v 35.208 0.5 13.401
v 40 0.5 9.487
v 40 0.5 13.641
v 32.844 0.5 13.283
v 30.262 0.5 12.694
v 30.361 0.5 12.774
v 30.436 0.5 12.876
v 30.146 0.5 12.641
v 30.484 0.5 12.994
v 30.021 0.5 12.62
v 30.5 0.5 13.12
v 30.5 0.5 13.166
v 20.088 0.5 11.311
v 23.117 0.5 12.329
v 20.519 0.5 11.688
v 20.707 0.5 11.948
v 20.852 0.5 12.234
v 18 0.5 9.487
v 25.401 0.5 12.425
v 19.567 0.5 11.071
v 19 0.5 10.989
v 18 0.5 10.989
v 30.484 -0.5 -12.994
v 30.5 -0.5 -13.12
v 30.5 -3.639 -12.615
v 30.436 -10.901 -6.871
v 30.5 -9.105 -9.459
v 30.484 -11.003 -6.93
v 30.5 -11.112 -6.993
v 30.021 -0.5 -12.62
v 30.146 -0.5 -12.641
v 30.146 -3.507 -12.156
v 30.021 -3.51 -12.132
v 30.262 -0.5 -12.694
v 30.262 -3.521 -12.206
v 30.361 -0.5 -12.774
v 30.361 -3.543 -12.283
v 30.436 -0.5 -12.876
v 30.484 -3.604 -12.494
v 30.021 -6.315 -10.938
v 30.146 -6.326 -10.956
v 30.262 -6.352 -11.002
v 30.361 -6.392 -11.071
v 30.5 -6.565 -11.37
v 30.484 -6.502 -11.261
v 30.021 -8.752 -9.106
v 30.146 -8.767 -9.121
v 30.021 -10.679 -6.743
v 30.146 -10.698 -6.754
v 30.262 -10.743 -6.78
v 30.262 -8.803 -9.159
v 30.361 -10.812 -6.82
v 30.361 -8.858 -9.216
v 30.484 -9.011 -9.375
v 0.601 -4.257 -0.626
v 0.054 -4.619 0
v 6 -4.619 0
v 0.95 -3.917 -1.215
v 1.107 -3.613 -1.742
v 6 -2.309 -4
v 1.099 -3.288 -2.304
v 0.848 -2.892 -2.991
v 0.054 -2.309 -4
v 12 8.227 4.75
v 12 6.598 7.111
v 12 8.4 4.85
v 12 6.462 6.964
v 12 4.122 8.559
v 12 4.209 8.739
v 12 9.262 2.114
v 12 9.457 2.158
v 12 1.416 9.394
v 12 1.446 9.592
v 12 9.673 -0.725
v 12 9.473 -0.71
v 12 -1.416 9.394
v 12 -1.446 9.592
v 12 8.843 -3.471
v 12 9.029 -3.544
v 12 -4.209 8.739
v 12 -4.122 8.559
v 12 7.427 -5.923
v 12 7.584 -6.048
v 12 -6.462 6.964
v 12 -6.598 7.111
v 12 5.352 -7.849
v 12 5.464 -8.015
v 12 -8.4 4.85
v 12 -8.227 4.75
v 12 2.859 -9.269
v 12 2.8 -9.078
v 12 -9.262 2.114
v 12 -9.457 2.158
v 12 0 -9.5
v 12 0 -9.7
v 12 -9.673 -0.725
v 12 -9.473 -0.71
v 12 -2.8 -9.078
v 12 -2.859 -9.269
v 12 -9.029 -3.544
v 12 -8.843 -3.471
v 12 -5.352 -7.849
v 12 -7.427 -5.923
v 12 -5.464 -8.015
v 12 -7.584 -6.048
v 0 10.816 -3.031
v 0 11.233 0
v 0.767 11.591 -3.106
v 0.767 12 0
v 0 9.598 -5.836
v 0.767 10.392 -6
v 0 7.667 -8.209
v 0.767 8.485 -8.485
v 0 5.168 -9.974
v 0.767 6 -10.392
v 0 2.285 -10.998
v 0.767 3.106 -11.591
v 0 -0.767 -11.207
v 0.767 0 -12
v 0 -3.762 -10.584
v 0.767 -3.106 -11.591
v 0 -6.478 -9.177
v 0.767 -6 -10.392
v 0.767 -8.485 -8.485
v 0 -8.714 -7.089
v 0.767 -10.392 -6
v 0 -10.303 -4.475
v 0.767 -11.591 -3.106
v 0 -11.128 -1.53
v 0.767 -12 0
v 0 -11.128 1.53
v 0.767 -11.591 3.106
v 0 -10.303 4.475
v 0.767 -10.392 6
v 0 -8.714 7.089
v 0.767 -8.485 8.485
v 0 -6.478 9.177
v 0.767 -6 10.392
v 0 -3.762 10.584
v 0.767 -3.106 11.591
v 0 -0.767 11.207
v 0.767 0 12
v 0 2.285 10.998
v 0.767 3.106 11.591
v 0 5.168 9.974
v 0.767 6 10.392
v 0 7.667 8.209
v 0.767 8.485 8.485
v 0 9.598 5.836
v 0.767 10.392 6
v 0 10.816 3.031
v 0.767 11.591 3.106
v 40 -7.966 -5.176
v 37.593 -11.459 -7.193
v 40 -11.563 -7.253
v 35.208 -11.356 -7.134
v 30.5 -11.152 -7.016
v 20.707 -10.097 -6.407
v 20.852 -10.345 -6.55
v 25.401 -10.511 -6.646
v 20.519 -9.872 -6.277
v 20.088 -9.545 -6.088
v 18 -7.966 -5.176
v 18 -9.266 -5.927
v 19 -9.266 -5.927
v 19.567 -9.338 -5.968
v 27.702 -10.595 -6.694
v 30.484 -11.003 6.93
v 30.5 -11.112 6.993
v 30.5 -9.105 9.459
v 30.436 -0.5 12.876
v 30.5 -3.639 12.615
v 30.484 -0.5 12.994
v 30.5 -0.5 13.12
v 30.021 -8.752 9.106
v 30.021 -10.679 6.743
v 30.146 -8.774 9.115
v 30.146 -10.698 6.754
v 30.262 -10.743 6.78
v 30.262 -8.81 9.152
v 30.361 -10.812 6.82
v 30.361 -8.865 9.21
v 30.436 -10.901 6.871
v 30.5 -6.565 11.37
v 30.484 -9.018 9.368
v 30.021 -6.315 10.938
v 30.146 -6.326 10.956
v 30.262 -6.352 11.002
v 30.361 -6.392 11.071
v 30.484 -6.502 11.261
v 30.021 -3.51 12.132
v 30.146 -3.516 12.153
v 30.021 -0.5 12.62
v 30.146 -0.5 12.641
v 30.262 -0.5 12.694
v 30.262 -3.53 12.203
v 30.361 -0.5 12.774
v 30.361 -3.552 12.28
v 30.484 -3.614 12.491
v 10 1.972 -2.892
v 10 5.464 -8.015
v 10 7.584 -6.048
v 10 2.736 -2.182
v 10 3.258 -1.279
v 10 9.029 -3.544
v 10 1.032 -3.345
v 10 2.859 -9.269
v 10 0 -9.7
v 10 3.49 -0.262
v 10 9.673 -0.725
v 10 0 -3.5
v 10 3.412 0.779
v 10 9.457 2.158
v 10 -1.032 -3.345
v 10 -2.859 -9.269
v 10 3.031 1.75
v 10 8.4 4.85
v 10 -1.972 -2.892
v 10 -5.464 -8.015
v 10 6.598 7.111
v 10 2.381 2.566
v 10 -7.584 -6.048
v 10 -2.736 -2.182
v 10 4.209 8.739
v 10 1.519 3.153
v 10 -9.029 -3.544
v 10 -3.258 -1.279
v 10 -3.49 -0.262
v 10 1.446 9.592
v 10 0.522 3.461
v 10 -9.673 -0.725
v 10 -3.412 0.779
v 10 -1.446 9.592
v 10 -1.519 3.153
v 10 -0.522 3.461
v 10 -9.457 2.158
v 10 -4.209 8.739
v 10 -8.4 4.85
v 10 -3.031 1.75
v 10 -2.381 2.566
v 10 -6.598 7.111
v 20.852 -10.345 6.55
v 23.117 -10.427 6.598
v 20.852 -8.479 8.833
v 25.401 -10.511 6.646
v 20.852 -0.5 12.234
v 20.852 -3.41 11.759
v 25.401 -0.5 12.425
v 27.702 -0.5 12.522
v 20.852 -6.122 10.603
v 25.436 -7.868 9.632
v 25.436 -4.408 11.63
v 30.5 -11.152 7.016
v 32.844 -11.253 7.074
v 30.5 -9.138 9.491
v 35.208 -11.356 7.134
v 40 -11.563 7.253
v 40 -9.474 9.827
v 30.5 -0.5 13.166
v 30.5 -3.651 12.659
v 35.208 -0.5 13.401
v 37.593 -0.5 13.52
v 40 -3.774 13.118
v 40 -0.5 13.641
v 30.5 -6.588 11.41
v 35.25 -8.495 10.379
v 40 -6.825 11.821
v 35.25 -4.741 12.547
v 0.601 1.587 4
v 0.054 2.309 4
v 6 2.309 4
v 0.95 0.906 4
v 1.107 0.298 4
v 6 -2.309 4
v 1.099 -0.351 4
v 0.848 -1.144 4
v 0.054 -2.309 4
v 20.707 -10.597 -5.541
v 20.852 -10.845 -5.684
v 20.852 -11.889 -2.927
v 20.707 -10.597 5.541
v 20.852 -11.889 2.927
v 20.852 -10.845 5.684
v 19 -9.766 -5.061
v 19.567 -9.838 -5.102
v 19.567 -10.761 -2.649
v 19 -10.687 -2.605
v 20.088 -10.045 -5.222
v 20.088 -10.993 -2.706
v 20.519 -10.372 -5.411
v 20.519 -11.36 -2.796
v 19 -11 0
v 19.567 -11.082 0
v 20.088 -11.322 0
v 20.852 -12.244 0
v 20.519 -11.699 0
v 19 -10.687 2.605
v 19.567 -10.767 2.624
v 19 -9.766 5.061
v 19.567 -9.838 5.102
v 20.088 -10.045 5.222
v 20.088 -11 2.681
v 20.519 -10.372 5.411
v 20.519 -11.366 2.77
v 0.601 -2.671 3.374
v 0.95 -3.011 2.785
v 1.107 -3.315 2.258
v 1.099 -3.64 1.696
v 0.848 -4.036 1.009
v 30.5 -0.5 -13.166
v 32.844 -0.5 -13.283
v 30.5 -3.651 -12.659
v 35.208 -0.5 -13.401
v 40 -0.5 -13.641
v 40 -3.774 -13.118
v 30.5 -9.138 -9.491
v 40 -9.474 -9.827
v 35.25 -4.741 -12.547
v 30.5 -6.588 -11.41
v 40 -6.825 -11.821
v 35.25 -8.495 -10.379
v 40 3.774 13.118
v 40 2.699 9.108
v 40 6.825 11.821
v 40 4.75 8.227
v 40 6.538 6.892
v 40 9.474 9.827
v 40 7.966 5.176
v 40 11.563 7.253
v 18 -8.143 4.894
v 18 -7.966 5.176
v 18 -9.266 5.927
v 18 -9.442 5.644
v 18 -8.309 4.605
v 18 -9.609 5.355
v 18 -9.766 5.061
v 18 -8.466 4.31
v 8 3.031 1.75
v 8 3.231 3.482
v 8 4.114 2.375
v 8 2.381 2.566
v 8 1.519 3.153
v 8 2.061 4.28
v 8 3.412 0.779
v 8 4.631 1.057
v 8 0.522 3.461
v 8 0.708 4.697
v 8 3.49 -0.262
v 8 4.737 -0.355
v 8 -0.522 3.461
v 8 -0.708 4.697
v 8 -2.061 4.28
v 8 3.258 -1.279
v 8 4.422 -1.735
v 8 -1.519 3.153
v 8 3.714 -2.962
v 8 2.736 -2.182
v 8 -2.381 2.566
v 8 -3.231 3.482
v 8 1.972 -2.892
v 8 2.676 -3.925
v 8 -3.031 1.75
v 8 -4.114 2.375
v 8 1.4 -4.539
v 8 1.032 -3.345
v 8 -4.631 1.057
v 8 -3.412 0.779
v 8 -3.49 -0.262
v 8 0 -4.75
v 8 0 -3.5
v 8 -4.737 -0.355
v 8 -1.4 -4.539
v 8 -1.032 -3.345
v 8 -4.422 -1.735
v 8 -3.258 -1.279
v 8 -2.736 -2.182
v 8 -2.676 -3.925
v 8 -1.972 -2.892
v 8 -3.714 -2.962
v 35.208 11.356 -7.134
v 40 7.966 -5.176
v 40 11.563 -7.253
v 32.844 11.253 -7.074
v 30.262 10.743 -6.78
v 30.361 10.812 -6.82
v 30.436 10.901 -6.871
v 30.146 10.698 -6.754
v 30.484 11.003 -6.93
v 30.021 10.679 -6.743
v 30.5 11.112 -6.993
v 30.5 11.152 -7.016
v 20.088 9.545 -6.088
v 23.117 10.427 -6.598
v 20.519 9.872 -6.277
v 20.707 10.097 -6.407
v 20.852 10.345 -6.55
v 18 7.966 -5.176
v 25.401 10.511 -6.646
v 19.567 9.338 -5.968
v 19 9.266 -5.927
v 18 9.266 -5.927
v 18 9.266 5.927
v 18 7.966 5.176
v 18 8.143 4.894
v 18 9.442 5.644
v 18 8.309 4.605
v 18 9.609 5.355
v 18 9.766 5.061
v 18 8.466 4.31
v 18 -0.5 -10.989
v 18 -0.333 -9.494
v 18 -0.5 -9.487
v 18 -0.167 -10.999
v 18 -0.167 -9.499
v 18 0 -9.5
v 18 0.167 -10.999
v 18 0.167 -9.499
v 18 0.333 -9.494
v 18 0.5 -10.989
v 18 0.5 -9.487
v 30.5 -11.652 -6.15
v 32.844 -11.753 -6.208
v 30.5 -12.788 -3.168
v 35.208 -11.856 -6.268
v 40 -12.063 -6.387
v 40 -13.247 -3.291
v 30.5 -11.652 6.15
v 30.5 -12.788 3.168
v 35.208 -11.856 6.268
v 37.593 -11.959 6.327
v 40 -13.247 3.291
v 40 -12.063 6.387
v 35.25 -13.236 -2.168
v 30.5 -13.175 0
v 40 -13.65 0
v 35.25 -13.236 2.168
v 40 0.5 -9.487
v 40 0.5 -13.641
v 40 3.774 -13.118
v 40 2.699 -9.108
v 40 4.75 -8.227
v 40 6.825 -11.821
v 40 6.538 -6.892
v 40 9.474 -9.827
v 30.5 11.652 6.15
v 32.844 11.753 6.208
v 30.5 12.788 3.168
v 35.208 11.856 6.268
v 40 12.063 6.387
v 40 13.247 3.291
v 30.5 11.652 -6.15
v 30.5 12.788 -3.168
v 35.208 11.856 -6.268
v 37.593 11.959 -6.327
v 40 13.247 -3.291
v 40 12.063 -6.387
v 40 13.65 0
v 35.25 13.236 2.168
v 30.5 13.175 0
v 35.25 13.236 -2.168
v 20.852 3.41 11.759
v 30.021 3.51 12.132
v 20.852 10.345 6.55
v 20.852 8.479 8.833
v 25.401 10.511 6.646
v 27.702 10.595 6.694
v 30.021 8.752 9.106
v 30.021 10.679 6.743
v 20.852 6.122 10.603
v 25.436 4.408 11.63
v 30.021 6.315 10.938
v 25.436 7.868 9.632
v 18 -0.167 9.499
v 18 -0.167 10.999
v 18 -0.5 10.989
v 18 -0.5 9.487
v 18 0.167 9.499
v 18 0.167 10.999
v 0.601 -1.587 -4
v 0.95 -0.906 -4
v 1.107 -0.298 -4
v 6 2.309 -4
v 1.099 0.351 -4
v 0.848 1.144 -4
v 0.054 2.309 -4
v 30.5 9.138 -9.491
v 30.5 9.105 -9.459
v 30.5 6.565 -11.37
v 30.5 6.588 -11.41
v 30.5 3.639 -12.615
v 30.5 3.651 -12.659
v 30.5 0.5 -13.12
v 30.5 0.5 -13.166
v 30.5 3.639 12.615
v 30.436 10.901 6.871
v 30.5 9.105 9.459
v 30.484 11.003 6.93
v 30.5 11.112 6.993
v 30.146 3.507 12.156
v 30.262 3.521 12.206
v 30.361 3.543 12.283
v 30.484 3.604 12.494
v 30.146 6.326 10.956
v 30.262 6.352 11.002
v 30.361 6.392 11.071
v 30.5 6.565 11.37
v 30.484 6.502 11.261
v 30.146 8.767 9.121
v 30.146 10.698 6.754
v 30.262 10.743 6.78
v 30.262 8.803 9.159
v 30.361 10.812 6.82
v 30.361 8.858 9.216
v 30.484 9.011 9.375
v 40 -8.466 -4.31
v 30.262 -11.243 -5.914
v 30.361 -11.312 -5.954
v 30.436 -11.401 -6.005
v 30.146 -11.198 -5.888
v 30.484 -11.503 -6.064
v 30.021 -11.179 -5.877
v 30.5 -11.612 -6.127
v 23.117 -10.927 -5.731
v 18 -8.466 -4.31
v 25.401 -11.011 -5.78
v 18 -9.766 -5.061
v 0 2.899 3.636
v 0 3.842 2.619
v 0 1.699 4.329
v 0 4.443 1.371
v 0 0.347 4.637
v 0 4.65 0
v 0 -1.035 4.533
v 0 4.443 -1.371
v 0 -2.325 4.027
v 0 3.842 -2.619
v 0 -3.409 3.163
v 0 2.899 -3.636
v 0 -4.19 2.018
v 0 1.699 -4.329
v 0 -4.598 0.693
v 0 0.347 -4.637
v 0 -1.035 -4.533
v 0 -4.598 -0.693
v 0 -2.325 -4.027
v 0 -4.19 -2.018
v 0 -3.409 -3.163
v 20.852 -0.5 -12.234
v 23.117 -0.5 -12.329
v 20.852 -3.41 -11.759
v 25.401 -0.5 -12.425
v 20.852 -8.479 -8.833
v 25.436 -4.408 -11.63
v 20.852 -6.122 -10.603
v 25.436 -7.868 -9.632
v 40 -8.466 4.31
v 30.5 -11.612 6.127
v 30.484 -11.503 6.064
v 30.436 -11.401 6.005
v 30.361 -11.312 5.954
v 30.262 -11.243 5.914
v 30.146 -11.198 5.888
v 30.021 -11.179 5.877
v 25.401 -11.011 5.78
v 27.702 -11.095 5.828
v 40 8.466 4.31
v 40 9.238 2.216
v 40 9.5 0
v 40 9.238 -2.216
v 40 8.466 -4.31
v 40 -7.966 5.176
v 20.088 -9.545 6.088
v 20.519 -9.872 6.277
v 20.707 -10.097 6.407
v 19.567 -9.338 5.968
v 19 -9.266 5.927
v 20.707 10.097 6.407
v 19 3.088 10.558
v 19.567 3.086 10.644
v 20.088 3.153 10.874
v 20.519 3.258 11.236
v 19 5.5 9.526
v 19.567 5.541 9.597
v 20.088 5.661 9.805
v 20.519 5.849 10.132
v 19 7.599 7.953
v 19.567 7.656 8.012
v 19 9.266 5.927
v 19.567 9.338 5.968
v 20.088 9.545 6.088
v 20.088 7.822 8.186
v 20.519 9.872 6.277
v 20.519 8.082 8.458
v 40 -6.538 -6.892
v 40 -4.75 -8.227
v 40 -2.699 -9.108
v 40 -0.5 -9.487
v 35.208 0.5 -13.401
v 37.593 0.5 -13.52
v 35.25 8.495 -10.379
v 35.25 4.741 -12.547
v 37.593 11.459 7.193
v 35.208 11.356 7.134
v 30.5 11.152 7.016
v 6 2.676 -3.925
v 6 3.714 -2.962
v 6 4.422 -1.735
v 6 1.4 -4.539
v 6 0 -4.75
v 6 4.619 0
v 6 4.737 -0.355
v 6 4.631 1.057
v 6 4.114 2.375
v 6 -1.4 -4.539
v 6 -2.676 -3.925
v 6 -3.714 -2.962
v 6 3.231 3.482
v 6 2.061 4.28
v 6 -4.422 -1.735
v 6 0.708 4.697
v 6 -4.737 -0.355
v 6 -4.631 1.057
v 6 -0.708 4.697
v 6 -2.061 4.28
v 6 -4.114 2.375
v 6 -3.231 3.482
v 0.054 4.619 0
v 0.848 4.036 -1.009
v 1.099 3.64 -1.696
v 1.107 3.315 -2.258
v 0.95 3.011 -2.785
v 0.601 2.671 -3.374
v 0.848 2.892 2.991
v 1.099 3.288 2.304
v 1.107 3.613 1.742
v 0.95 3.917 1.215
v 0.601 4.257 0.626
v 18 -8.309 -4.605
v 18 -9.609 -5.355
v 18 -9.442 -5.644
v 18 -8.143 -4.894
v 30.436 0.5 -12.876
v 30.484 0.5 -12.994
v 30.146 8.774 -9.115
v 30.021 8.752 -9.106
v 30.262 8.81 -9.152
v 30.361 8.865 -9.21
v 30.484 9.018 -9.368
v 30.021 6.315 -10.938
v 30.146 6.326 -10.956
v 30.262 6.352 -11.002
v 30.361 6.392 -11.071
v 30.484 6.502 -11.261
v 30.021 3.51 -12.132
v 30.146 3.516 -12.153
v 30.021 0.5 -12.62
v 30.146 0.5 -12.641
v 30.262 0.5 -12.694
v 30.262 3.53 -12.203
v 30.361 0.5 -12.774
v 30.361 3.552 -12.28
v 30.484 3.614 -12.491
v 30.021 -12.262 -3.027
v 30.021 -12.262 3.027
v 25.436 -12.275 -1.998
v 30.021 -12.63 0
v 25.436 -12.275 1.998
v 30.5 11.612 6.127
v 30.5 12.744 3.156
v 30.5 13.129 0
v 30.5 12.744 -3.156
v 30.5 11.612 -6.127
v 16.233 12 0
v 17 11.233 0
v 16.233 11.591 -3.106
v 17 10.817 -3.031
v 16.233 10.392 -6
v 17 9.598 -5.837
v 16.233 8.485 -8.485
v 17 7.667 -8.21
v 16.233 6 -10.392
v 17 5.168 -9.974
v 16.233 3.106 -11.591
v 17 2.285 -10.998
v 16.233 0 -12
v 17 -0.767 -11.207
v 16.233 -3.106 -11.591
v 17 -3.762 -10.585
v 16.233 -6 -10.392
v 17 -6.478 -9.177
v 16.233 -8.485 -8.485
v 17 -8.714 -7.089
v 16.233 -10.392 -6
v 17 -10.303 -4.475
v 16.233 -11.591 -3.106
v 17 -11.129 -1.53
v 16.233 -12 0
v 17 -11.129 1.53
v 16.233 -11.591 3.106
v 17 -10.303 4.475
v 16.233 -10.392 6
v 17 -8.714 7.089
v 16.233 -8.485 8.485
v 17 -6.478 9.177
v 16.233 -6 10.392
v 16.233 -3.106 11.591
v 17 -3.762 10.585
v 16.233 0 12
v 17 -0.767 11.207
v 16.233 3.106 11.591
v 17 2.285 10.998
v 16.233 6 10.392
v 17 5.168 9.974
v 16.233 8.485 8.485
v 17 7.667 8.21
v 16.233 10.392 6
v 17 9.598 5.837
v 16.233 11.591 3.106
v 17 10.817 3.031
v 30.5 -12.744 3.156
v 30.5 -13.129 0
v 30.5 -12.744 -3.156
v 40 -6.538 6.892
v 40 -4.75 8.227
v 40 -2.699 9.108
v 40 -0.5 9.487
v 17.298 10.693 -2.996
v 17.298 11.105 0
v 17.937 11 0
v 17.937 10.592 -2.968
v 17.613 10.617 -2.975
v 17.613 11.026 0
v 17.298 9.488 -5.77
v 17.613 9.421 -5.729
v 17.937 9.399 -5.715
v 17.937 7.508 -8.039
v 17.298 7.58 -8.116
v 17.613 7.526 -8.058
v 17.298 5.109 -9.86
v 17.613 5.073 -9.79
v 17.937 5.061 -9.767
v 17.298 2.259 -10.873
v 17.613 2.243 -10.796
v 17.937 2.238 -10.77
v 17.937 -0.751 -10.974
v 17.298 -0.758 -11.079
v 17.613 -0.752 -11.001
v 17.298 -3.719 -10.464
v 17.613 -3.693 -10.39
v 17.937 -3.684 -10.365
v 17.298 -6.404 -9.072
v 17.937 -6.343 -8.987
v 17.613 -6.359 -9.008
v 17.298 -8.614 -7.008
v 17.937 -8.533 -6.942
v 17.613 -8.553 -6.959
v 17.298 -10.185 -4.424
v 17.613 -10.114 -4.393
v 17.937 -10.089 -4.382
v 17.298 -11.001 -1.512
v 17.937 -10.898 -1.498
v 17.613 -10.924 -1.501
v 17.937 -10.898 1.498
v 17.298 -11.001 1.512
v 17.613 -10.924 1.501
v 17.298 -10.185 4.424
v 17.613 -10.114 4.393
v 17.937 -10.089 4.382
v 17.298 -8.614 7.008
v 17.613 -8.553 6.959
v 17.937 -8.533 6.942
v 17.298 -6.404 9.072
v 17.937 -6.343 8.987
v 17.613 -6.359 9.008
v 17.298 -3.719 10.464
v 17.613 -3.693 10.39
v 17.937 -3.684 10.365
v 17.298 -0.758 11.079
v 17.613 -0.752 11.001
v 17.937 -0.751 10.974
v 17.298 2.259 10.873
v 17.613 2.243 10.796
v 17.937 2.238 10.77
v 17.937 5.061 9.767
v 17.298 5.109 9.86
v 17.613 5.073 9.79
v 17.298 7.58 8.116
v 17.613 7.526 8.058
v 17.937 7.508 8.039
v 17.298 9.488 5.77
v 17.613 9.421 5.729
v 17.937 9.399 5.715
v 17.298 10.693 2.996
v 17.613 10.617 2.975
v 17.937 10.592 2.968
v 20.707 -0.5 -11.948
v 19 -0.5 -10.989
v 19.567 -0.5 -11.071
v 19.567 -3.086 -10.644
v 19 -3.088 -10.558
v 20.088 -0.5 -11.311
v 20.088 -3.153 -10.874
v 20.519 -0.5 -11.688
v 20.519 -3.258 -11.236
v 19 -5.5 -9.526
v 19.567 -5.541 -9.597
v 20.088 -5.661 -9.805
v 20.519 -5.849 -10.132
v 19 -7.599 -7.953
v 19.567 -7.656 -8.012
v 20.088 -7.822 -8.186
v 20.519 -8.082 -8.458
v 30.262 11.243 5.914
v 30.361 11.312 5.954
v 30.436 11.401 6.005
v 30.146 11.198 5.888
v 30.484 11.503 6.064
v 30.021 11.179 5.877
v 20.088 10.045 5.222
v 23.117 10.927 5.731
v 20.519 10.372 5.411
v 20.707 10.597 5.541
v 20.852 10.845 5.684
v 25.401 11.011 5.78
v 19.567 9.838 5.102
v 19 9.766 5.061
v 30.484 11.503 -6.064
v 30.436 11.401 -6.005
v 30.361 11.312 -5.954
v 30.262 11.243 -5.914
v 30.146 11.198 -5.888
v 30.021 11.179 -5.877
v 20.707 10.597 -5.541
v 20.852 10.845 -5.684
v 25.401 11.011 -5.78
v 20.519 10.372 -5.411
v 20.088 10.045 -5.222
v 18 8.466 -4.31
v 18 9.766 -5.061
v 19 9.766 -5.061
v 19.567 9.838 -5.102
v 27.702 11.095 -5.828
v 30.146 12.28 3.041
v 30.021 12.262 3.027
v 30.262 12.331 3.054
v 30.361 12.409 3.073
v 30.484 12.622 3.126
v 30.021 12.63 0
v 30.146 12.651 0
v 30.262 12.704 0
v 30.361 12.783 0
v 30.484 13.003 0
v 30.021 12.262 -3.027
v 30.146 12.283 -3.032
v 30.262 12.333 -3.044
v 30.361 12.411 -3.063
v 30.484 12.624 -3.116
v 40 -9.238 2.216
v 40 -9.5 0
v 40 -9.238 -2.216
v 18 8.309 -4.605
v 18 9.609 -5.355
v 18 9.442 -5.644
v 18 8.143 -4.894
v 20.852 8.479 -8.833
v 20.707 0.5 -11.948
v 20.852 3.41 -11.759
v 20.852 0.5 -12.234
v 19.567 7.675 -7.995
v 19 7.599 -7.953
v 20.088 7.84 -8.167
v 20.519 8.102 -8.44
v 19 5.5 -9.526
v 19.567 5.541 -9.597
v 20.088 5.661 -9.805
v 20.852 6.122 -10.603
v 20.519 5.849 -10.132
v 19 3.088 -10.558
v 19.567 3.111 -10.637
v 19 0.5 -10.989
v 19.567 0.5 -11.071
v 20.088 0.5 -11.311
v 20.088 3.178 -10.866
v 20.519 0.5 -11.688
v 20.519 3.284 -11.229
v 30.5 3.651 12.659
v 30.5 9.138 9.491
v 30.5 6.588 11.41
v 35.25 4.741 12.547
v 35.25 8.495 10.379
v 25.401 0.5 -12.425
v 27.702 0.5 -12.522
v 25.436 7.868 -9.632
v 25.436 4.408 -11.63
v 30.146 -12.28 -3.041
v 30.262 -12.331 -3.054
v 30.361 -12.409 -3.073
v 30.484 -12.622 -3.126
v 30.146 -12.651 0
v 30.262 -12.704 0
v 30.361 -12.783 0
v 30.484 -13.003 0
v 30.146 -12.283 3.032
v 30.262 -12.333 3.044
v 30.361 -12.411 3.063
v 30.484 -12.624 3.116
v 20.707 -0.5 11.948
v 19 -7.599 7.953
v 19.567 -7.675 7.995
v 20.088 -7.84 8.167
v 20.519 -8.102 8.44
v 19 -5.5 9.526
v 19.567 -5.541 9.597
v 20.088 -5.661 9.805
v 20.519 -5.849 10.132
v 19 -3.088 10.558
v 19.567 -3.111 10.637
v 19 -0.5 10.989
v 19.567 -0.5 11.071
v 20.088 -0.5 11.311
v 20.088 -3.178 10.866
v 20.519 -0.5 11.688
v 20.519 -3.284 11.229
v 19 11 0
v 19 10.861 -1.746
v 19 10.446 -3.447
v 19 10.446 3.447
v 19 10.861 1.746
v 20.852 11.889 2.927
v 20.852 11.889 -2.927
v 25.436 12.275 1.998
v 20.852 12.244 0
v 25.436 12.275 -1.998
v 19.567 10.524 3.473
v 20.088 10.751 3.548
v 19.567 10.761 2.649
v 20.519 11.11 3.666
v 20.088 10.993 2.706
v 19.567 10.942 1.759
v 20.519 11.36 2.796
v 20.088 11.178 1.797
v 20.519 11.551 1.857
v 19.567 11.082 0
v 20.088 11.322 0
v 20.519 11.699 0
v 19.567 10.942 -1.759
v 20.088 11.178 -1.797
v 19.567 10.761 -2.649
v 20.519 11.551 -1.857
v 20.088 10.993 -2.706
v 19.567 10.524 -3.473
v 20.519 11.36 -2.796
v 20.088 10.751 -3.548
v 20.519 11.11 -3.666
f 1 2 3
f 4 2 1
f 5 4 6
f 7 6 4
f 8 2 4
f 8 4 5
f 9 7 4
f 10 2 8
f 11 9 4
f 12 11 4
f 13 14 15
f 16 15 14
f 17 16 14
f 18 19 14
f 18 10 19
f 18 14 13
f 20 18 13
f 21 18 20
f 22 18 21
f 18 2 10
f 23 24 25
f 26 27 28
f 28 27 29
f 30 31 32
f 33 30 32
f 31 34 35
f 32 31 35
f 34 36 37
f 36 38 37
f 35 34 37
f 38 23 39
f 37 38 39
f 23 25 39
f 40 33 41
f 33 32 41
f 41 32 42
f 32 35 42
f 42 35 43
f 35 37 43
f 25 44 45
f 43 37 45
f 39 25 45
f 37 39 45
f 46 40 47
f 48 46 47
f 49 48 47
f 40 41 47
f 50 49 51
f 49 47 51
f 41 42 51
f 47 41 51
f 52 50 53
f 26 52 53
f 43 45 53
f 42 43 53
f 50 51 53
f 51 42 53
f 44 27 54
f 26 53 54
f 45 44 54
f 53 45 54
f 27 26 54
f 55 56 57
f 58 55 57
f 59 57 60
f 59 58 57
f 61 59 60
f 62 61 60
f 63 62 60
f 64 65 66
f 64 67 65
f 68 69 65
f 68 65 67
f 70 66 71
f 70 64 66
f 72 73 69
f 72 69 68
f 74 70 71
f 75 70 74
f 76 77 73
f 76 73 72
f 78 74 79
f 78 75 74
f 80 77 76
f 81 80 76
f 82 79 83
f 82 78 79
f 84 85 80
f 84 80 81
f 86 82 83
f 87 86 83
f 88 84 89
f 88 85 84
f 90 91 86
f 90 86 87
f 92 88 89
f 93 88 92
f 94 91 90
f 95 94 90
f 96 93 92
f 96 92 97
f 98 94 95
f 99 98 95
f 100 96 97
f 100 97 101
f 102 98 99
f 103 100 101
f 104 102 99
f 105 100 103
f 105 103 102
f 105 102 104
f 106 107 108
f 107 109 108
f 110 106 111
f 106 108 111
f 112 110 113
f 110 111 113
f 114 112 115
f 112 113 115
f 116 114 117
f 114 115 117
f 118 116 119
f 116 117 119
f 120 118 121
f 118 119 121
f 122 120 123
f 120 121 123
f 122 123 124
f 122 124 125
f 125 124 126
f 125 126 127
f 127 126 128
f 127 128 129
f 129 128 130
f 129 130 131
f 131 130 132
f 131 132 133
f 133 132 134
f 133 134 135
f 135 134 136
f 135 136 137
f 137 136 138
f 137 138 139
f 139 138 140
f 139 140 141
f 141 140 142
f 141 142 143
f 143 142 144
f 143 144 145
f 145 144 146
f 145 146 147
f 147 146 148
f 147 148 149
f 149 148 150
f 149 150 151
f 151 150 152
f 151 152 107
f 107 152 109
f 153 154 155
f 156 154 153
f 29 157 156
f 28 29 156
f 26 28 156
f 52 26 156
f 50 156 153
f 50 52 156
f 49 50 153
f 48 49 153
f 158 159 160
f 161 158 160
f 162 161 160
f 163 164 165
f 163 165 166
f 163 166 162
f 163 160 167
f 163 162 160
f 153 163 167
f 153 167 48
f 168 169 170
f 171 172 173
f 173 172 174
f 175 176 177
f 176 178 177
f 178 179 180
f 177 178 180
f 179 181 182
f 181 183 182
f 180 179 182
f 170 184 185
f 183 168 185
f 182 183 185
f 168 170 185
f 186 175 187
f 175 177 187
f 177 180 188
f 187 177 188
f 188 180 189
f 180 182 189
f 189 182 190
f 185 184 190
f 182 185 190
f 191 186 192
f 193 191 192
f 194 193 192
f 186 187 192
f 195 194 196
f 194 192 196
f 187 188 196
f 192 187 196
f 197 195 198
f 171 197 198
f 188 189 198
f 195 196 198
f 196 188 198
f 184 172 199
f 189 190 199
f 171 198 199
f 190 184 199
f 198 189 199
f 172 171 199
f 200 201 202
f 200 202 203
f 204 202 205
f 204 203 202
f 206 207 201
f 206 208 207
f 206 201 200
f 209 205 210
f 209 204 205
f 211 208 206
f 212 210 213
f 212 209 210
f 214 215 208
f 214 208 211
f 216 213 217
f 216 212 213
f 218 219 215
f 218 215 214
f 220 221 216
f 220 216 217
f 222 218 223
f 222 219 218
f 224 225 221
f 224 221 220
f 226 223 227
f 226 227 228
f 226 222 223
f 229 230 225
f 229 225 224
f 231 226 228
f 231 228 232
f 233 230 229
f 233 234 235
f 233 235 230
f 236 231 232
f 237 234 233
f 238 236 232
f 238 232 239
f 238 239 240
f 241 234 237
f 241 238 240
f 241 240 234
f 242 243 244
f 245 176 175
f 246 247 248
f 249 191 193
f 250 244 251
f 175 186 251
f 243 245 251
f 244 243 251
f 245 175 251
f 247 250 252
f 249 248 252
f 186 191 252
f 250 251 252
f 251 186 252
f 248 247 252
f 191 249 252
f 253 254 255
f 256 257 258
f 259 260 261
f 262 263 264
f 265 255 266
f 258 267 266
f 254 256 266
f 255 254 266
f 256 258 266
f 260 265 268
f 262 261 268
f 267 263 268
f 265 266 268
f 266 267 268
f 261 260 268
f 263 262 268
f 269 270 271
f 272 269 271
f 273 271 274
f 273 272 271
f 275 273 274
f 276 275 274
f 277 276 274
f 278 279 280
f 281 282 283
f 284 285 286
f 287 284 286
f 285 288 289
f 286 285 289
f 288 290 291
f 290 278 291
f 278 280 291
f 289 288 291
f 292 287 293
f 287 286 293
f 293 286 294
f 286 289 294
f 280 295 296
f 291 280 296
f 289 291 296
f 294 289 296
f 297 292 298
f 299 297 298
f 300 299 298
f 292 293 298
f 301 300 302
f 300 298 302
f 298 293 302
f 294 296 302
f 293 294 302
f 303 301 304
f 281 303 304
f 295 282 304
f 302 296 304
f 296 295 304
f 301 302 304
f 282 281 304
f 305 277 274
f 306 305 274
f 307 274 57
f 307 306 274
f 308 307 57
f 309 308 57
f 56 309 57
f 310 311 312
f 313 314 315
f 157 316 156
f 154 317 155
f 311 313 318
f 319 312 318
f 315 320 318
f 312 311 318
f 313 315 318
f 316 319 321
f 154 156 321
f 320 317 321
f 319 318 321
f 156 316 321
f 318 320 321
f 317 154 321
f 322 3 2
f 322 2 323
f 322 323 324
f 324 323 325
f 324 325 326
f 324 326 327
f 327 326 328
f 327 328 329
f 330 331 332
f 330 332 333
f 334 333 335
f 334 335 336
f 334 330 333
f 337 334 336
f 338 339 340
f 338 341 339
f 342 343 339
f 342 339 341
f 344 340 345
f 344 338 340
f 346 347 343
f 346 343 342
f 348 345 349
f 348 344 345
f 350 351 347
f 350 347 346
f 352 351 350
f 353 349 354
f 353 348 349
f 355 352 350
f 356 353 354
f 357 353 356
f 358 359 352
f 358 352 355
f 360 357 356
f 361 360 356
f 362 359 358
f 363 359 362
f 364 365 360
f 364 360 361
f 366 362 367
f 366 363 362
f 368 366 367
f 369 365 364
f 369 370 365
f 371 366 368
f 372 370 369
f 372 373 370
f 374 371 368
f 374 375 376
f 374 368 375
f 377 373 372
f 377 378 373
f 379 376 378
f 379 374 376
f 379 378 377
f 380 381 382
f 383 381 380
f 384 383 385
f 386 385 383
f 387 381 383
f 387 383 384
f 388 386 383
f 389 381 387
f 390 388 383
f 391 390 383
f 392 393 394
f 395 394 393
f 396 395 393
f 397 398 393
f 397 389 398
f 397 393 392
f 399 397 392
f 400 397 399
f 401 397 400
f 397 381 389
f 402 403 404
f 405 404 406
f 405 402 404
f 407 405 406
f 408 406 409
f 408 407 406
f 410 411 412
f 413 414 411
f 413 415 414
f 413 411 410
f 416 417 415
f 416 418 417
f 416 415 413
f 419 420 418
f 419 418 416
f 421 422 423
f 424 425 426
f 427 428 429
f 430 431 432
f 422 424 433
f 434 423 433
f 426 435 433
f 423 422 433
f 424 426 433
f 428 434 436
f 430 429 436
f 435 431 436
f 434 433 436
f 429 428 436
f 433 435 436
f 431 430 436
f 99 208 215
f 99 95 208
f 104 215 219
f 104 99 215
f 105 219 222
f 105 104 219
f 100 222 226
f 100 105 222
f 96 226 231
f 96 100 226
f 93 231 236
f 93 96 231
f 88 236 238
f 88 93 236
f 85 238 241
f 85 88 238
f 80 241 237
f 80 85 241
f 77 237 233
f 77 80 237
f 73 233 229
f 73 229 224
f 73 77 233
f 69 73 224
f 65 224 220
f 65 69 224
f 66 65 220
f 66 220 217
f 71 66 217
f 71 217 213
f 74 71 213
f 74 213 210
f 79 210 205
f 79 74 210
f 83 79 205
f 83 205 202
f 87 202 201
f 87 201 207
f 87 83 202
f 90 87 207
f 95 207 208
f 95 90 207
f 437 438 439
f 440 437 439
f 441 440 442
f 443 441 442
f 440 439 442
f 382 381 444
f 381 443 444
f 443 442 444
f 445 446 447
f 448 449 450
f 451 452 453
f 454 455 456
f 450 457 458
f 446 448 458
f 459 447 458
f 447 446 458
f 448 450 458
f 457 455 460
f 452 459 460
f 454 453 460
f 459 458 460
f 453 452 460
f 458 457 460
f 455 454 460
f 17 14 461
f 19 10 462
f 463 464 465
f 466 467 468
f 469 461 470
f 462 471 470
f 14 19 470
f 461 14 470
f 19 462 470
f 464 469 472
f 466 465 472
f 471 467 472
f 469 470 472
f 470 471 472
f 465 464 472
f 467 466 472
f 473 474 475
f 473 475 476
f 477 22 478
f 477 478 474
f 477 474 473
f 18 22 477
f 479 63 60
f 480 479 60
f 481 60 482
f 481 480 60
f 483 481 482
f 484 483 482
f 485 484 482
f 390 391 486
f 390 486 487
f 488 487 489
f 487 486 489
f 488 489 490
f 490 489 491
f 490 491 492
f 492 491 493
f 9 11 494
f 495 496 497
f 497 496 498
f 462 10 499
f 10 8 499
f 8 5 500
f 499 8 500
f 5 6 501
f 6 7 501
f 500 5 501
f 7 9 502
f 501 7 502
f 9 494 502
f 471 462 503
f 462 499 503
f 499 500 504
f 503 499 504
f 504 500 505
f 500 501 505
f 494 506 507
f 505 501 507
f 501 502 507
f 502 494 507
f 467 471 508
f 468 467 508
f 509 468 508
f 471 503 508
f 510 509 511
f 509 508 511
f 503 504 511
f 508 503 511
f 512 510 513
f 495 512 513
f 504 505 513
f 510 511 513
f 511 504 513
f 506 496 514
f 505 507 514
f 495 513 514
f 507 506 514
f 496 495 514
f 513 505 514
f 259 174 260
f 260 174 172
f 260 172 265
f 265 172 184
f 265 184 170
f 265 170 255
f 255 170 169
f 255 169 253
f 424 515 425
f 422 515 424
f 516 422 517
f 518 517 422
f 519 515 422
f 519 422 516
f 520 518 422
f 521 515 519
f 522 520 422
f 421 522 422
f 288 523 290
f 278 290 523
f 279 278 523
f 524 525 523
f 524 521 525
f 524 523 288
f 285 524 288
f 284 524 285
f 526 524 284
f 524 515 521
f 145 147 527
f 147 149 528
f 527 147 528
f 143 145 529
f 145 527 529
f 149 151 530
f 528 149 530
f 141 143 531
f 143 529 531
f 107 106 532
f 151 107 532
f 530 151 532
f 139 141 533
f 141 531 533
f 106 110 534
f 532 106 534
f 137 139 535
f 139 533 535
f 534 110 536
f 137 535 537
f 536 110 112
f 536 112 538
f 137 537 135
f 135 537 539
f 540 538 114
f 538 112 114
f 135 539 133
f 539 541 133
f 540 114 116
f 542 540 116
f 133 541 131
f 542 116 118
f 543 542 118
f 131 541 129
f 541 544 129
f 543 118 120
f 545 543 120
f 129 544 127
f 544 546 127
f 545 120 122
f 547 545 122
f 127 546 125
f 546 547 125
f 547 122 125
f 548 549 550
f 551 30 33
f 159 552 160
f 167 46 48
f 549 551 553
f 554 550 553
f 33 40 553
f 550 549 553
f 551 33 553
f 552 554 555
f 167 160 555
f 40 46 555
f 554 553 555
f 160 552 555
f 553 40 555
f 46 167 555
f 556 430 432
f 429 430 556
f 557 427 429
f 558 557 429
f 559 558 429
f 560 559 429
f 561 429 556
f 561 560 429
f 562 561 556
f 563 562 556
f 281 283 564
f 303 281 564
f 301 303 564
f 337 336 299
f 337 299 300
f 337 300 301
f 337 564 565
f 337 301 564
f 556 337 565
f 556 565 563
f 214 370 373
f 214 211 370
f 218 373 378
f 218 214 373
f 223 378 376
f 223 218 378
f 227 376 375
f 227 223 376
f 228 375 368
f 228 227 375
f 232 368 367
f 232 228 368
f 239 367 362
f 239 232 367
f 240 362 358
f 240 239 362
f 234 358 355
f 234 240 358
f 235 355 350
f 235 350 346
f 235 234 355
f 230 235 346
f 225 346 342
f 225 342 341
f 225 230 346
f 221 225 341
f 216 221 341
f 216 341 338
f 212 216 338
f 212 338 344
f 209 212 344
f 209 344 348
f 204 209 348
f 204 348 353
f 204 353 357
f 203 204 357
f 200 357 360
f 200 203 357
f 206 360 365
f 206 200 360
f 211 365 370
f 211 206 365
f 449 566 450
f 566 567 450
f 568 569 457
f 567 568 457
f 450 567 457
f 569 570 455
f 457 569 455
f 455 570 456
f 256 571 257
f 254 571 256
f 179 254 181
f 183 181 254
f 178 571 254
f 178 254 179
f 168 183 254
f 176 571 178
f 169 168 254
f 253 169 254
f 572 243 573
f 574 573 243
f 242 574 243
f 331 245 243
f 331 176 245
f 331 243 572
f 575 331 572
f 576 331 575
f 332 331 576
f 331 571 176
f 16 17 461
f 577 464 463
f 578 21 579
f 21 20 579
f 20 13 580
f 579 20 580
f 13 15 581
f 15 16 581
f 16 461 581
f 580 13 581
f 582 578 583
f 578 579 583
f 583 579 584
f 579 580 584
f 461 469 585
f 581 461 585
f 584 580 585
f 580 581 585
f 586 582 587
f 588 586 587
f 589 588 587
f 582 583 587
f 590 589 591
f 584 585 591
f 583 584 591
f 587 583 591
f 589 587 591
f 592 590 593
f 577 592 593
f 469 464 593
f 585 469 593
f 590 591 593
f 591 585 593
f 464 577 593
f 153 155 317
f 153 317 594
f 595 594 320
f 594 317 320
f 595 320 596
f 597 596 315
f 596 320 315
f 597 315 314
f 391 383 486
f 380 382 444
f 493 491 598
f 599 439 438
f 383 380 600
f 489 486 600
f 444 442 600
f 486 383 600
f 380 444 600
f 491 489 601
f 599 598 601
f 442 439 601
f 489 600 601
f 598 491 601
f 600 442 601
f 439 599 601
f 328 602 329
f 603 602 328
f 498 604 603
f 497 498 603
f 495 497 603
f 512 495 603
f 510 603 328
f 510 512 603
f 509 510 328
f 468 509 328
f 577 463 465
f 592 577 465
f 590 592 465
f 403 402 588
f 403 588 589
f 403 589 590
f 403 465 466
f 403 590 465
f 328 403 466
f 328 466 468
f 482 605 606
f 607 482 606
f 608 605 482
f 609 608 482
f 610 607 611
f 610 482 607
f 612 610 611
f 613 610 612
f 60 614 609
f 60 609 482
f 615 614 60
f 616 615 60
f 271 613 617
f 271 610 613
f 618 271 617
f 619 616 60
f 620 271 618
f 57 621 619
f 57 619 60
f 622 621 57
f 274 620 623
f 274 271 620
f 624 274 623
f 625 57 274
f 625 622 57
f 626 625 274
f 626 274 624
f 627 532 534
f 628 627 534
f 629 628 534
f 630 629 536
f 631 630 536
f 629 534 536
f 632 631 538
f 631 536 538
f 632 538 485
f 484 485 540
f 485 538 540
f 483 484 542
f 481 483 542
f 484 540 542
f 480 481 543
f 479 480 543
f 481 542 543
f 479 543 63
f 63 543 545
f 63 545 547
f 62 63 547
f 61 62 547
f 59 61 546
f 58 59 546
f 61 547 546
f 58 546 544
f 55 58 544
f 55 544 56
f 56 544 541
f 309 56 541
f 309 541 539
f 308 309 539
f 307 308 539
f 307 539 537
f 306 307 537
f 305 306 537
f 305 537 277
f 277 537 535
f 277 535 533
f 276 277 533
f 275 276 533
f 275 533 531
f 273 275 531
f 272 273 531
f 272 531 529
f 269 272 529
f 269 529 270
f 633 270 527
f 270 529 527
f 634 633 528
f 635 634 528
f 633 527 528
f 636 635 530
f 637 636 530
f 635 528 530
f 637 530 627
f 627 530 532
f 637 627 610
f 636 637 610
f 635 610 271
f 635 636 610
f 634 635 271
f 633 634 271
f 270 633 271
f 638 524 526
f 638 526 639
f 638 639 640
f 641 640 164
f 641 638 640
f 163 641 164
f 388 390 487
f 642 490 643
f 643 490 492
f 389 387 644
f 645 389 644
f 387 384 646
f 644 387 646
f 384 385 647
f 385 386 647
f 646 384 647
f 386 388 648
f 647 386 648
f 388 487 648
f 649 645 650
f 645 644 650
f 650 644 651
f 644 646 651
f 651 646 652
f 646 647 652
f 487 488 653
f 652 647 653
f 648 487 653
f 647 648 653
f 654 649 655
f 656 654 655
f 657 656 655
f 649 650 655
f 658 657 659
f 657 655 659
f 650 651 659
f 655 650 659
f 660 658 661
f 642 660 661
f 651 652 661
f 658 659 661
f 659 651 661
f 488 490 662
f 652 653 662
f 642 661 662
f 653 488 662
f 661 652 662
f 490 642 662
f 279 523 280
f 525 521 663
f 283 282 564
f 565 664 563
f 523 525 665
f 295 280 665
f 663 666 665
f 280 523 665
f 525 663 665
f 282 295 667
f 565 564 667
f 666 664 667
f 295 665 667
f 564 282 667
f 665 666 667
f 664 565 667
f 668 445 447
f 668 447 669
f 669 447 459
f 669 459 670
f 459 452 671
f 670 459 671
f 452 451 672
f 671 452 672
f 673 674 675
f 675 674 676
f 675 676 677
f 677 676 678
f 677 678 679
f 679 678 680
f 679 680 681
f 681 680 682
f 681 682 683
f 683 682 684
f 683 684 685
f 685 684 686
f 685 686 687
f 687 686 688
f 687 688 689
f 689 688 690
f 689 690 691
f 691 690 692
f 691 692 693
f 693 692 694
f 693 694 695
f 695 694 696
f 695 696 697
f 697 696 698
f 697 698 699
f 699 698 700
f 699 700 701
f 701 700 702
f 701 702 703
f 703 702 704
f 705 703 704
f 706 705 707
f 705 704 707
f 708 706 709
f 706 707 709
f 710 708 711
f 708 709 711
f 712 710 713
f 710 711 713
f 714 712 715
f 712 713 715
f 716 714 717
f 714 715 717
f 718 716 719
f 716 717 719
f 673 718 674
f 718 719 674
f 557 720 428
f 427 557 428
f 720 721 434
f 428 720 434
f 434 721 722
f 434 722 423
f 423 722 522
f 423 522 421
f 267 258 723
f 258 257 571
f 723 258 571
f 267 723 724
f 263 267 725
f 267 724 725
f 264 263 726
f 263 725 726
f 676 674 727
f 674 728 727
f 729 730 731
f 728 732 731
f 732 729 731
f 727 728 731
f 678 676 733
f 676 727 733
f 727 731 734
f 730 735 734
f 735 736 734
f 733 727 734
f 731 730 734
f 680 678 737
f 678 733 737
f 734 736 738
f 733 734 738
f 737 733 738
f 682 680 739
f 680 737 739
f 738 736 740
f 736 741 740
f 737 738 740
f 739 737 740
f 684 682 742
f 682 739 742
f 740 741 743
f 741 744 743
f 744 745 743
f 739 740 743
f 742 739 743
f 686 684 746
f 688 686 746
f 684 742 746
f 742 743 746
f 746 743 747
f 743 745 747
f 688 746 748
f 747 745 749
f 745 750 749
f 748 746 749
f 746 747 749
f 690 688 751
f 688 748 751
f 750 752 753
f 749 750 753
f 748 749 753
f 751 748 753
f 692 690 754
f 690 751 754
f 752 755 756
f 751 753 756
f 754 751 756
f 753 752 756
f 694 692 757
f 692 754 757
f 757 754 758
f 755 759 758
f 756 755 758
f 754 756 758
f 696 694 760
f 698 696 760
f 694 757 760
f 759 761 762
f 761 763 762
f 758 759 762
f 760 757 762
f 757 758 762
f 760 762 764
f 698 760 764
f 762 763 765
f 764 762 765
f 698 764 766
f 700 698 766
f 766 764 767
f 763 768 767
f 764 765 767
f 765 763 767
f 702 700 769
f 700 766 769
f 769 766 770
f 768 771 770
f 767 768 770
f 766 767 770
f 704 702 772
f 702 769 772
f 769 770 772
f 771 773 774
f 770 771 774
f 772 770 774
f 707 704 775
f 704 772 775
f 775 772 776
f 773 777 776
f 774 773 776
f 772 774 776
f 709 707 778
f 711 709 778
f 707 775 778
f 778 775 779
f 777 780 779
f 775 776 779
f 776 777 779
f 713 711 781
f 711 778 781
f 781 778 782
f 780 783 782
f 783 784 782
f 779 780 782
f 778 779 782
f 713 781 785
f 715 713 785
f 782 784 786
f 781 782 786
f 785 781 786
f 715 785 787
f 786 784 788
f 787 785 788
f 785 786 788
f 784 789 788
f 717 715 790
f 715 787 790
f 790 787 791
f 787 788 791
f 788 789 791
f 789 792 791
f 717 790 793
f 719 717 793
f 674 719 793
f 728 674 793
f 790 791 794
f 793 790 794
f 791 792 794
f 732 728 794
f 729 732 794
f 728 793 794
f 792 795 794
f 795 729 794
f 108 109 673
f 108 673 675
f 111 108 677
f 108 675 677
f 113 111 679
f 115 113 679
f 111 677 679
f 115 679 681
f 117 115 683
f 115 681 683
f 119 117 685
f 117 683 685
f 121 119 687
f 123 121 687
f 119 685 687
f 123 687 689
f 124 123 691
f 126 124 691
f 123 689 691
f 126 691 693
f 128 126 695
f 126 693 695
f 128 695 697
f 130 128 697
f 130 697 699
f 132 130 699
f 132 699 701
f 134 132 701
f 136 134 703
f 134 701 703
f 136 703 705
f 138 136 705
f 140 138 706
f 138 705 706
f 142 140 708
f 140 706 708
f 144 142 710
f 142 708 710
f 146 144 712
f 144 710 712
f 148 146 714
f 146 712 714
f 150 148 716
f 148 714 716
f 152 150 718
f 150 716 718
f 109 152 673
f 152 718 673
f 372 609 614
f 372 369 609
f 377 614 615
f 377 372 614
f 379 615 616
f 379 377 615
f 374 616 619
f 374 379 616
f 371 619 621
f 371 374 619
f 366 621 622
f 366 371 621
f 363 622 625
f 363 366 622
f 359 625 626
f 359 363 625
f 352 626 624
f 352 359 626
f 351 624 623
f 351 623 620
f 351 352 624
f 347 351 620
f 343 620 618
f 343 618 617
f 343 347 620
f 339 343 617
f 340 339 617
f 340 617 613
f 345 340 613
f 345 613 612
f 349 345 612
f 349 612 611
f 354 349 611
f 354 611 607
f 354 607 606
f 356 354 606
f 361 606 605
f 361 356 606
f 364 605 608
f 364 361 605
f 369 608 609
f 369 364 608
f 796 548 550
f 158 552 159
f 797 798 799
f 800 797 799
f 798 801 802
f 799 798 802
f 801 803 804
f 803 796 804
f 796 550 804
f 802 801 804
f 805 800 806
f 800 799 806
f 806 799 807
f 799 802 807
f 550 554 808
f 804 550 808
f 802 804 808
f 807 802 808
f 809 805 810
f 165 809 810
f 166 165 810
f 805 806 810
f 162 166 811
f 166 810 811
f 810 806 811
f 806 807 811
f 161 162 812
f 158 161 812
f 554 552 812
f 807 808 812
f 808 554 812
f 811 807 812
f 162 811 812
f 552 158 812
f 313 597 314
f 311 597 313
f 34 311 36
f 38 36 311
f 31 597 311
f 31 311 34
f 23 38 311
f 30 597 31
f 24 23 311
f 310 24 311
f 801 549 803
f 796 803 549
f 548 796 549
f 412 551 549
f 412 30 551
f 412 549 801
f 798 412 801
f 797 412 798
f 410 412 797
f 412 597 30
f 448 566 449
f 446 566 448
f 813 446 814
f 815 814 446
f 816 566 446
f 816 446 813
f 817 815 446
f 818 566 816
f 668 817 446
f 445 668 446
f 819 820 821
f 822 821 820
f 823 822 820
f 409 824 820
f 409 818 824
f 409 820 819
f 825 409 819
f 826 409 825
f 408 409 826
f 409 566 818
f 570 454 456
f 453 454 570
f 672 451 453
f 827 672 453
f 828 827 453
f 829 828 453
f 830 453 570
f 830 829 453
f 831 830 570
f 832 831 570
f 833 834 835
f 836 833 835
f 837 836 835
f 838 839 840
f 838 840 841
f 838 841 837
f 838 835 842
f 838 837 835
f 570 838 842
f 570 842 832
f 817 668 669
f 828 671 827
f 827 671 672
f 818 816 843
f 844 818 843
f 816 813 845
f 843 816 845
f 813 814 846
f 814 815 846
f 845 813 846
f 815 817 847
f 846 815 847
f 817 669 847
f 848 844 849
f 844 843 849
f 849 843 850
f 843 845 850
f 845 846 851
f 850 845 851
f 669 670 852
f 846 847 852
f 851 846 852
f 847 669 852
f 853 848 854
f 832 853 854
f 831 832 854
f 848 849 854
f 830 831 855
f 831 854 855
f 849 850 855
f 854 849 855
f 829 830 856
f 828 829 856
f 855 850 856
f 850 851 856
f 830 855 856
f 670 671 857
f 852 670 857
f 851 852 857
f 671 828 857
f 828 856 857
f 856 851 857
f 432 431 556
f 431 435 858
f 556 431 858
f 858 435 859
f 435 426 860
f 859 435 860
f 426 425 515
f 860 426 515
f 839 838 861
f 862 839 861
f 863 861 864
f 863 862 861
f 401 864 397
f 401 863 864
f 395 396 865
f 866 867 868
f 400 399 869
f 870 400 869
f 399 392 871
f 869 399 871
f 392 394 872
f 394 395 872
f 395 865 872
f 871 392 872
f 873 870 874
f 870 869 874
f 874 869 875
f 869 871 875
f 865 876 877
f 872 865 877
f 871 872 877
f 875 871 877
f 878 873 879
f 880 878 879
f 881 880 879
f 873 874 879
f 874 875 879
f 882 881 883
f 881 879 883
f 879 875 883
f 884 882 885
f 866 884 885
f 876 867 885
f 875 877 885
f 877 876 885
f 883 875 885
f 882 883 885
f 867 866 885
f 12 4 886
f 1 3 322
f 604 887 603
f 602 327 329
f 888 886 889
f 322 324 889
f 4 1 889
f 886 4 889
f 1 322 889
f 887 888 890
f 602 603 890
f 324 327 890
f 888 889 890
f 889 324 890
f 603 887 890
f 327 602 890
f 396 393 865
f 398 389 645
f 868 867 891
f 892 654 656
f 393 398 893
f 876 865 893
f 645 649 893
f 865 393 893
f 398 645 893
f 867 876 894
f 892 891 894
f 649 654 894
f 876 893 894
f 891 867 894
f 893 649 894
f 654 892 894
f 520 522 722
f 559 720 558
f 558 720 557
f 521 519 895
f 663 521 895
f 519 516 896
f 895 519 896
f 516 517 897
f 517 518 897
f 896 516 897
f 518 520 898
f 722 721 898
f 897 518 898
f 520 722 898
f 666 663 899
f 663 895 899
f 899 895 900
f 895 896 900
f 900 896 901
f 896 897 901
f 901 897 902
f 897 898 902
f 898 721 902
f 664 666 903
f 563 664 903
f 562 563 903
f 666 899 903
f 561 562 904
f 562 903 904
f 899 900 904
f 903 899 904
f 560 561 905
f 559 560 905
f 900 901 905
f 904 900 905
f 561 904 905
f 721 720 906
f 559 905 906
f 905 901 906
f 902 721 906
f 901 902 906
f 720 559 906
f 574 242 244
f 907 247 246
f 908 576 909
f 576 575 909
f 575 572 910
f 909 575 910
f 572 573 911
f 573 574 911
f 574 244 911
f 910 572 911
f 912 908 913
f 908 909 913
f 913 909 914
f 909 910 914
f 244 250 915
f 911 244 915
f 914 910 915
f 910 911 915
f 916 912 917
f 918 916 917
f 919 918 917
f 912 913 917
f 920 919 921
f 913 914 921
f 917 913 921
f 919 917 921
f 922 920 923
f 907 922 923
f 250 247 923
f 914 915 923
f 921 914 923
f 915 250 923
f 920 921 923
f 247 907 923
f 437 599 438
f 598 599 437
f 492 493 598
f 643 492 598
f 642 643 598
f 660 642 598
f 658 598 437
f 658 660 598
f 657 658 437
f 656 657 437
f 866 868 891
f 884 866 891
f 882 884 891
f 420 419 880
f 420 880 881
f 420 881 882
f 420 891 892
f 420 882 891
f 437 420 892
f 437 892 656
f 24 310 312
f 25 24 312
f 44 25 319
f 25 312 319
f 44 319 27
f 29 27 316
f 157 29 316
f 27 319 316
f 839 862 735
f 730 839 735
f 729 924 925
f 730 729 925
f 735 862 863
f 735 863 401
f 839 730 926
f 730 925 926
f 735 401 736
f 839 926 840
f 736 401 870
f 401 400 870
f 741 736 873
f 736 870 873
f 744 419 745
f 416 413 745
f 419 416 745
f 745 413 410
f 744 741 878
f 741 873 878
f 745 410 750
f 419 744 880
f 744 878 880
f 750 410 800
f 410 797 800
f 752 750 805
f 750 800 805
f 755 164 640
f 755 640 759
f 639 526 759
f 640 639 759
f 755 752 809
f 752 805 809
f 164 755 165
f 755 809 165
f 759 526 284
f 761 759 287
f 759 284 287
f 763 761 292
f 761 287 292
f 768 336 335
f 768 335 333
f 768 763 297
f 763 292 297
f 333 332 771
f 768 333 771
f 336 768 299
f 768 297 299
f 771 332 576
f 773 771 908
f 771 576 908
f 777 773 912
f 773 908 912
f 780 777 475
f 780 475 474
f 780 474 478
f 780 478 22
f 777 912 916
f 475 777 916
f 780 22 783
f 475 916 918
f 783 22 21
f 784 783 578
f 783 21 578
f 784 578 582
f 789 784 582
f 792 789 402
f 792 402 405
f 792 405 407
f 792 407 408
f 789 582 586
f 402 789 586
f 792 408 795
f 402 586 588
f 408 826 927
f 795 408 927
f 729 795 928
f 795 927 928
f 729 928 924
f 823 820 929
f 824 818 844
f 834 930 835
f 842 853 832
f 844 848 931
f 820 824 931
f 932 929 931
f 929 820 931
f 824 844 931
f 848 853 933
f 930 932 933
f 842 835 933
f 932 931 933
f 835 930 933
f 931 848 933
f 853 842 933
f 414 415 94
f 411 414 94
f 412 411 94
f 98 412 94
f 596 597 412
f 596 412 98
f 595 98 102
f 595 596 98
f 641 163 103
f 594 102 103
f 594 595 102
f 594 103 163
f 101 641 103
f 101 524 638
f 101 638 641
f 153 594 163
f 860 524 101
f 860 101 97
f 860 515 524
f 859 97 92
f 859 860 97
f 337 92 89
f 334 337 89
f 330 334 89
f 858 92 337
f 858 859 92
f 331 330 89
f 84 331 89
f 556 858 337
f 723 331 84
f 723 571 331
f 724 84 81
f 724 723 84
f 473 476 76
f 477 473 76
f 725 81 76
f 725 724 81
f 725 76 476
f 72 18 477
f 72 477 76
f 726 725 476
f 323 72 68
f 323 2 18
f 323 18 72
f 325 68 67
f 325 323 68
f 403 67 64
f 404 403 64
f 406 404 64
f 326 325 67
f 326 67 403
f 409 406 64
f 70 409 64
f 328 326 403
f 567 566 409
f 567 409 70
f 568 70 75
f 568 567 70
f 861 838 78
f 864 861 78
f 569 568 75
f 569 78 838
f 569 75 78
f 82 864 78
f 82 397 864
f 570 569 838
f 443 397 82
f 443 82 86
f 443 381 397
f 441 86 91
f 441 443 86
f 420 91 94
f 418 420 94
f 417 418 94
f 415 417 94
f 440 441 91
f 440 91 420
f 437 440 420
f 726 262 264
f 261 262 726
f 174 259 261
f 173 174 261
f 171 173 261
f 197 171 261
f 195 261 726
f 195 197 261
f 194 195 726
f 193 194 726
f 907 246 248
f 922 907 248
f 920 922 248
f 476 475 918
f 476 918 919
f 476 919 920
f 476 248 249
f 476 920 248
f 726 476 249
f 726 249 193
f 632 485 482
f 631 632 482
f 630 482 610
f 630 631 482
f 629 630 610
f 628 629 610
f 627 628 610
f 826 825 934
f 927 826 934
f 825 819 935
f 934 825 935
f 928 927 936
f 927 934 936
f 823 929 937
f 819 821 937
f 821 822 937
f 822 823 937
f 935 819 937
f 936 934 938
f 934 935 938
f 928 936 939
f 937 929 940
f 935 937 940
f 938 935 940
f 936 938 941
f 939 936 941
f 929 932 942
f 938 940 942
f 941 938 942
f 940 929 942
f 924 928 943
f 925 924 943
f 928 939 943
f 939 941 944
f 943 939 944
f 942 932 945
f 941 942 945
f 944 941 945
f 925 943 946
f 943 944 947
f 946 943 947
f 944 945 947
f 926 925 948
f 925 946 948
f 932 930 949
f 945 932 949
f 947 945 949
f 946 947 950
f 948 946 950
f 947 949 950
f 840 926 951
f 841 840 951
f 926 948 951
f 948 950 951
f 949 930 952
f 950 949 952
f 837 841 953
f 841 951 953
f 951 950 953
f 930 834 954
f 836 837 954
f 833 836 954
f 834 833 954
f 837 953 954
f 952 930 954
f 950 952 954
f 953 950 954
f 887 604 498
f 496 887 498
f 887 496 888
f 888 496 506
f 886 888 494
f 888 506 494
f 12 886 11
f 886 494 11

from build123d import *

# Parameters (mm, degrees)
CUT_EXTRUDE1_DEPTH = 6
CUT_EXTRUDE2_DEPTH = 40


with BuildPart() as part:
    # Sketch1 → Revolve1 (revolve)
    with BuildSketch(Plane.XY):
        with BuildLine():
            Line((8.054036255, 0), (0, 4.65))
            Line((0, 4.65), (0, 11.233))
            Line((0, 11.233), (0.767, 12))
            Line((0.767, 12), (16.233, 12))
            Line((16.233, 12), (16.999844549, 11.233155451))
            ThreePointArc((16.999844549, 11.233155451), (17.454138269, 11.059163956), (17.937, 11))
            Line((17.937, 11), (19, 11))
            ThreePointArc((19, 11), (20.115234375, 11.339803539), (20.851508163, 12.243747712))
            Line((20.851508163, 12.243747712), (30.021033995, 12.62983301))
            ThreePointArc((30.021033995, 12.62983301), (30.360913423, 12.783353536), (30.5, 13.129390385))
            Line((30.5, 13.129390385), (30.5, 13.175))
            Line((30.5, 13.175), (40, 13.65))
            Line((40, 13.65), (40, 0))
            Line((40, 0), (8.054036255, 0))
        make_face()
    revolve(axis=Axis((40, 0, 0), (-1, 0, 0)))

    # Sketch2 → Cut-Extrude1 (cut)
    with BuildSketch(Plane(origin=(0, 0, 0), x_dir=(0, 0, -1), z_dir=(1, 0, 0))):
        Polygon((-4, -2.309401077), (0, -4.618802154), (4, -2.309401077), (4, 2.309401077), (0, 4.618802154), (-4, 2.309401077), align=None)
    extrude(amount=CUT_EXTRUDE1_DEPTH, mode=Mode.SUBTRACT)

    # Sketch3 → Cut-Revolve1 (revolve, cut)
    with BuildSketch(Plane(origin=(0, 0, 0), x_dir=(1, 0, 0), z_dir=(0, 1, 0))):
        Polygon((6, 0), (6, 4.75), (8, 4.75), (8, 3.5), (10, 3.5), (10, 9.7), (12, 9.7), (12, 9.5), (42, 9.5), (42, 0), align=None)
    revolve(axis=Axis((42, 0, 0), (-1, 0, 0)), mode=Mode.SUBTRACT)

    # Sketch4 → Cut-Extrude2 (cut)
    with BuildSketch(Plane(origin=(18, 0, 0), x_dir=(0, 0, -1), z_dir=(1, 0, 0))):
        Polygon((-18.65, 0.5), (-18.65, -0.5), (-0.866025404, -0.5), (-9.758012702, -15.901373781), (-8.891987298, -16.401373781), (0, -1), (8.891987298, -16.401373781), (9.758012702, -15.901373781), (0.866025404, -0.5), (18.65, -0.5), (18.65, 0.5), (0.866025404, 0.5), (9.758012702, 15.901373781), (8.891987298, 16.401373781), (0, 1), (-8.891987298, 16.401373781), (-9.758012702, 15.901373781), (-0.866025404, 0.5), align=None)
    extrude(amount=CUT_EXTRUDE2_DEPTH, mode=Mode.SUBTRACT)


solid = part.part
